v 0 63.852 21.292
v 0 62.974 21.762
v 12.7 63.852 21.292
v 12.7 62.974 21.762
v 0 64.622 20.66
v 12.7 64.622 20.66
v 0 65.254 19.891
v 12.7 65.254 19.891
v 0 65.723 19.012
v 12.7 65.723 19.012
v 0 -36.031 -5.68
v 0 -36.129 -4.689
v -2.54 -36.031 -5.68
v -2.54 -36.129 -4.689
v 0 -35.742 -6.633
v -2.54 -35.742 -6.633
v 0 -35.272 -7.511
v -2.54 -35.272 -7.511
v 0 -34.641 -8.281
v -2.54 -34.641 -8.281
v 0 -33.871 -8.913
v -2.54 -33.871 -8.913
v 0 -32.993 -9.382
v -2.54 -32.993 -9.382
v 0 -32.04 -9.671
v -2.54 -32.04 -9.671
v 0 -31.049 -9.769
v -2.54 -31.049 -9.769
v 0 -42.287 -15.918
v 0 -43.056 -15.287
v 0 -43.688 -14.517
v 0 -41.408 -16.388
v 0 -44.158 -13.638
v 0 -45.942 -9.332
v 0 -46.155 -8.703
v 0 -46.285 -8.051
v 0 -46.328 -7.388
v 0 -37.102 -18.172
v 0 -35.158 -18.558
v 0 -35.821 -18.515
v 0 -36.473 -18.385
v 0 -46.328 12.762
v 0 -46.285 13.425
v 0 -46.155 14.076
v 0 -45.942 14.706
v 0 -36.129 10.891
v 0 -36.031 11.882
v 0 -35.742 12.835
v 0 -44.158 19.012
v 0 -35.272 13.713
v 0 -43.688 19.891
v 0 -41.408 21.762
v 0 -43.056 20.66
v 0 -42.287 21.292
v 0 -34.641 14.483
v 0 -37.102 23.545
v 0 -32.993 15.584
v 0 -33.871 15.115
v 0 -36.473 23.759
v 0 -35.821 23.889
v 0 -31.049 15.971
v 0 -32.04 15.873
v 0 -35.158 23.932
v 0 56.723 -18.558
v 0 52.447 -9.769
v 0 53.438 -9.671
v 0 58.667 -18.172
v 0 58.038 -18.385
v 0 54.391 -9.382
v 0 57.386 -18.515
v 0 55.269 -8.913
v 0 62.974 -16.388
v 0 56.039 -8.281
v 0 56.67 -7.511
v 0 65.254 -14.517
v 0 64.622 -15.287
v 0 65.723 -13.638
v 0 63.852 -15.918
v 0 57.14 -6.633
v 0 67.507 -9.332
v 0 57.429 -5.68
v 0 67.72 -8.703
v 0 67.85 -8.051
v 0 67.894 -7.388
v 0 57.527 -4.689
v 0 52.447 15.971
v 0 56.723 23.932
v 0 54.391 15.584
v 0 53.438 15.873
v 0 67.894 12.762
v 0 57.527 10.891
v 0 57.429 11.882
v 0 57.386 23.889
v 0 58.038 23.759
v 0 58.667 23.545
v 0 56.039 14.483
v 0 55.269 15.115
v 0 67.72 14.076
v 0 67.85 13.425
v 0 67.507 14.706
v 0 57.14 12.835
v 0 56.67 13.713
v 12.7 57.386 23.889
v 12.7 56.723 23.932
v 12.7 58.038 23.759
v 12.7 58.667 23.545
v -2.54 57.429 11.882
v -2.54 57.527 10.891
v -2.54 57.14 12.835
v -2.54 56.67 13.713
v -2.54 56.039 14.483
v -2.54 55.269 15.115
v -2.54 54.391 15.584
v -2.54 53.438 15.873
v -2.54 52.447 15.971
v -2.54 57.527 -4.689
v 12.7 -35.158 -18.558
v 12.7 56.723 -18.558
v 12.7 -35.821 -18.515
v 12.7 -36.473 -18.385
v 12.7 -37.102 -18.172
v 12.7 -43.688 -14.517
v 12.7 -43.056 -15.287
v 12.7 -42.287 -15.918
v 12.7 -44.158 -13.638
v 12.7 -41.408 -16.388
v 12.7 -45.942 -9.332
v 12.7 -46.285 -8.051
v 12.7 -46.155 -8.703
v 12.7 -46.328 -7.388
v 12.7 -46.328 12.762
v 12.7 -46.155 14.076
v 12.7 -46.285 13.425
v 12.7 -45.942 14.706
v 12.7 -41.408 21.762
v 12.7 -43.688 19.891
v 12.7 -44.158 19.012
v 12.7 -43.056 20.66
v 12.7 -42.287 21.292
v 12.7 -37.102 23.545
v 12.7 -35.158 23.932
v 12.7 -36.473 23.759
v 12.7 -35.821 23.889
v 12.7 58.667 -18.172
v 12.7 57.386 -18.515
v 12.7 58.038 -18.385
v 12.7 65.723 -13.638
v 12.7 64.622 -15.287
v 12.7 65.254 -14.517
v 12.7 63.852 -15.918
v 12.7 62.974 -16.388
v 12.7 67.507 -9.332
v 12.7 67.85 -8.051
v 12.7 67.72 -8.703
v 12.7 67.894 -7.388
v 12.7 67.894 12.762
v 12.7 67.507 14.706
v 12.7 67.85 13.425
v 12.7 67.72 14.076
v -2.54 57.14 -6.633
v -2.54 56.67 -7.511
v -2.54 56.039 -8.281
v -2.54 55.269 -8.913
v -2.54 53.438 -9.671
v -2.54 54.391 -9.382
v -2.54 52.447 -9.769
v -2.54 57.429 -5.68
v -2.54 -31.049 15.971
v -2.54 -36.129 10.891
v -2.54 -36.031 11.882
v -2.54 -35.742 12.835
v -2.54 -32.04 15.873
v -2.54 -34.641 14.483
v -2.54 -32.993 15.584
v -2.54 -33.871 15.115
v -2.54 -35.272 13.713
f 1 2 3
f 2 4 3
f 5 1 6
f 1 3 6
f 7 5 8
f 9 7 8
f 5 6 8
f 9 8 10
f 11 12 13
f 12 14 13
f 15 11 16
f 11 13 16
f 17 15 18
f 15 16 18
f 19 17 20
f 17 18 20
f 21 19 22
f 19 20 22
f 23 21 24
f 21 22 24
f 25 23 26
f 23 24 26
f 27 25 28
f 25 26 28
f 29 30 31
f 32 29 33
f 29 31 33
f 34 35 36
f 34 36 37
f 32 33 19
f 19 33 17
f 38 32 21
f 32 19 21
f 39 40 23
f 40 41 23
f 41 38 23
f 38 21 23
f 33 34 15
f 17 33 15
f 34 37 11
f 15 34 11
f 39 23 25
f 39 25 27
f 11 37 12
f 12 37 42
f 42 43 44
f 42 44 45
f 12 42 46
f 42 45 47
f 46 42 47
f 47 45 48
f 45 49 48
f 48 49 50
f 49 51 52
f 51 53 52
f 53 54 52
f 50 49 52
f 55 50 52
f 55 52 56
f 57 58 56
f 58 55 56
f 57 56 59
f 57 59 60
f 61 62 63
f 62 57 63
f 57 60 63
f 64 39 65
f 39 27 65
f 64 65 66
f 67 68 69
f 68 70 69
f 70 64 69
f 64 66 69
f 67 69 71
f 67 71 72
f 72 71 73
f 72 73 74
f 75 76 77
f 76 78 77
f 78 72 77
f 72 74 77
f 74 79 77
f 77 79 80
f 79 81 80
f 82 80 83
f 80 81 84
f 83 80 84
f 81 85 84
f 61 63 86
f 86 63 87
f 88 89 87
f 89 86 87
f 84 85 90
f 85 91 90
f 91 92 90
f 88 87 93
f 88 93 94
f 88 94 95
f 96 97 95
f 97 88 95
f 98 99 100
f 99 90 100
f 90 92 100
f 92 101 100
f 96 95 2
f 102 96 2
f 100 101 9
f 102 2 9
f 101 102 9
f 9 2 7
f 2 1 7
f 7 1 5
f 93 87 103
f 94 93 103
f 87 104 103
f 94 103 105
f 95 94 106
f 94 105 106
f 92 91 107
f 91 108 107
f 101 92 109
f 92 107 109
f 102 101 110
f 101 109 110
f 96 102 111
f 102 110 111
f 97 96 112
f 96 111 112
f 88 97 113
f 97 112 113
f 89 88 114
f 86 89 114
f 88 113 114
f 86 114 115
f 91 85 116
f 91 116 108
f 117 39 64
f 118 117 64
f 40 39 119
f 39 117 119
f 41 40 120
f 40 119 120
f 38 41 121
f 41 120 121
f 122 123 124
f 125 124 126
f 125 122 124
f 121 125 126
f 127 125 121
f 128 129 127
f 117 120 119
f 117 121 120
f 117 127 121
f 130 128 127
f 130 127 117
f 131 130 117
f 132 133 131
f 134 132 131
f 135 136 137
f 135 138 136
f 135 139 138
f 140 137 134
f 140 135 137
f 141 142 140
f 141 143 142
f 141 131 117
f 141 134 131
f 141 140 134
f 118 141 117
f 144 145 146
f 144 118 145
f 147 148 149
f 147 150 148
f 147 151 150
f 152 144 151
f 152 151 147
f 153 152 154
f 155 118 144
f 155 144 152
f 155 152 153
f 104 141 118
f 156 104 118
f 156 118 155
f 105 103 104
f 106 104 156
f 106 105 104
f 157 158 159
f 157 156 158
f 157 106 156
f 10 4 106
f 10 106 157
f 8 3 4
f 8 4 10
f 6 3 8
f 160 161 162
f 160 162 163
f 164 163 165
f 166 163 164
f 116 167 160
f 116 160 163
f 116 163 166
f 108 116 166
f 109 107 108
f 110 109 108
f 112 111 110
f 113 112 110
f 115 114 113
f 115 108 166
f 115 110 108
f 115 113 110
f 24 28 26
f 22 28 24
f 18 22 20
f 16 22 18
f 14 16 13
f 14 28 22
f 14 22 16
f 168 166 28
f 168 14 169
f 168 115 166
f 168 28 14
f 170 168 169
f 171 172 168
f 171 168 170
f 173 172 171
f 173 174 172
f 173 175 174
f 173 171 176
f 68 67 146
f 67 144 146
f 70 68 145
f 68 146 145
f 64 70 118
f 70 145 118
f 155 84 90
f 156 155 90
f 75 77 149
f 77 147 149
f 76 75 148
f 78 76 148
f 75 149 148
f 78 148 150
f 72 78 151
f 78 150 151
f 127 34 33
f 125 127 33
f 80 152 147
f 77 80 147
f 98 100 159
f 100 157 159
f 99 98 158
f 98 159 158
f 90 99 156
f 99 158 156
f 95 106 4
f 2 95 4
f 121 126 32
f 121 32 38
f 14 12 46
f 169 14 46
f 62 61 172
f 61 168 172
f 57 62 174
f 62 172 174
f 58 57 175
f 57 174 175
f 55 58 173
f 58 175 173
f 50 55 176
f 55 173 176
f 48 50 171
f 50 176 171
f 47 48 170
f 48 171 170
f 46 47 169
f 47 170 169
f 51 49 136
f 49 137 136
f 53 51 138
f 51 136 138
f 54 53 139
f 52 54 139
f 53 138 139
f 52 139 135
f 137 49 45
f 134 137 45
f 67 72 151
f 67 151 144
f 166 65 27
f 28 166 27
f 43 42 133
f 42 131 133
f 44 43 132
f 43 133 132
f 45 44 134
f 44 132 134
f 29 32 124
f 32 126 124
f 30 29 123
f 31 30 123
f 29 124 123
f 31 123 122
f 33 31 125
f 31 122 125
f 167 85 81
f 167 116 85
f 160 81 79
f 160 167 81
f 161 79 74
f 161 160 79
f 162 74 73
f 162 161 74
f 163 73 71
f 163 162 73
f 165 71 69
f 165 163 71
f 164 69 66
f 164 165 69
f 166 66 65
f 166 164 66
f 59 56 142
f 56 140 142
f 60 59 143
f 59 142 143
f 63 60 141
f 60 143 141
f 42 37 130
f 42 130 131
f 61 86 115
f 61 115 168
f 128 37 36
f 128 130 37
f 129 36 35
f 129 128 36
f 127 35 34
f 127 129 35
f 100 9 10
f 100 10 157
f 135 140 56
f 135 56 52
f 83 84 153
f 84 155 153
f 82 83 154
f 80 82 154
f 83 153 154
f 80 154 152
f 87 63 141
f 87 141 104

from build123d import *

# Parameters (mm, degrees)
F0_W        = 114.2217256129
F0_H        = 42.490478605
F1_DEPTH    = 12.7
F2_W        = 93.6551205814
F2_H        = 25.7396511734
F3_DEPTH    = 2.54
F4_R        = 5.08
F5_SIZE     = 5.08
F6_T1_DEPTH = 39.0415311919
F7_R        = 5.08


# Not quite as in the source:
# - a fillet or chamfer that OpenCascade refuses, or shapes differently, is made with other operations: its cross-section is extruded or revolved along the edge and cut away or added


with BuildPart() as f1:
    # F0 (on Right) → F1 (new body)
    with BuildSketch(Plane.YZ):
        with Locations((10.7826646417, 2.6869159192)):
            Rectangle(F0_W, F0_H)
    extrude(amount=F1_DEPTH)

    # F2 (on face) → F3 (join)
    with BuildSketch(Plane(origin=(0, 0, 0), x_dir=(0, -1, 0), z_dir=(-1, 0, 0))):
        with Locations((-10.6990095228, 3.1011626124)):
            Rectangle(F2_W, F2_H)
    extrude(amount=F3_DEPTH)

    # F4
    f4_edges = [f1.edges().sort_by_distance(p)[0] for p in [
        (-1.27, 57.52657, 15.970988),
        (-1.27, 57.52657, -9.768663),
        (-1.27, -36.128551, -9.768663),
        (-1.27, -36.128551, 15.970988),
    ]]
    fillet(f4_edges, radius=F4_R)

    # F5
    f5_edges = [f1.edges().sort_by_distance(p)[0] for p in [
        (6.35, 67.893527, 23.932155),
        (6.35, -46.328198, 23.932155),
        (6.35, 67.893527, -18.558323),
        (6.35, -46.328198, -18.558323),
    ]]
    chamfer(f5_edges, length=F5_SIZE)

    # F6: chamfer of 5.08 on 8 edges, made by hand

    # F6_s2 → F6_t1 (cut)
    with BuildSketch(Plane.YZ.offset(-13.170765596)):
        Polygon((64.3014249997, 22.4442576701), (67.8935274482, 13.7721552217), (67.8935274482, 18.8521552217), align=None)
        Polygon((57.7335274482, 23.9321552217), (66.4056298966, 20.3400527733), (62.8135274482, 23.9321552217), align=None)
        Polygon((66.4056298966, -14.9662209349), (57.7335274482, -18.5583233833), (62.8135274482, -18.5583233833), align=None)
        Polygon((67.8935274482, -8.3983233833), (64.3014249997, -17.0704258318), (67.8935274482, -13.4783233833), align=None)
        Polygon((-44.8403006131, -14.9662209349), (-36.1681981647, -18.5583233833), (-41.2481981647, -18.5583233833), align=None)
        Polygon((-46.3281981647, -8.3983233833), (-42.7360957163, -17.0704258318), (-46.3281981647, -13.4783233833), align=None)
        Polygon((-42.7360957163, 22.4442576701), (-46.3281981647, 13.7721552217), (-46.3281981647, 18.8521552217), align=None)
        Polygon((-36.1681981647, 23.9321552217), (-44.8403006131, 20.3400527733), (-41.2481981647, 23.9321552217), align=None)
    extrude(amount=F6_T1_DEPTH, mode=Mode.SUBTRACT)

    # F7
    f7_edges = [f1.edges().sort_by_distance(p)[0] for p in [
        (6.35, -43.352403, -15.582528),
        (6.35, -46.328198, -8.398323),
        (6.35, -36.168198, -18.558323),
        (6.35, -46.328198, 13.772155),
        (6.35, -43.352403, 20.95636),
        (6.35, -36.168198, 23.932155),
        (6.35, 57.733527, 23.932155),
        (6.35, 64.917732, 20.95636),
        (6.35, 67.893527, 13.772155),
        (6.35, 67.893527, -8.398323),
        (6.35, 64.917732, -15.582528),
        (6.35, 57.733527, -18.558323),
    ]]
    fillet(f7_edges, radius=F7_R)


solid = f1.part
